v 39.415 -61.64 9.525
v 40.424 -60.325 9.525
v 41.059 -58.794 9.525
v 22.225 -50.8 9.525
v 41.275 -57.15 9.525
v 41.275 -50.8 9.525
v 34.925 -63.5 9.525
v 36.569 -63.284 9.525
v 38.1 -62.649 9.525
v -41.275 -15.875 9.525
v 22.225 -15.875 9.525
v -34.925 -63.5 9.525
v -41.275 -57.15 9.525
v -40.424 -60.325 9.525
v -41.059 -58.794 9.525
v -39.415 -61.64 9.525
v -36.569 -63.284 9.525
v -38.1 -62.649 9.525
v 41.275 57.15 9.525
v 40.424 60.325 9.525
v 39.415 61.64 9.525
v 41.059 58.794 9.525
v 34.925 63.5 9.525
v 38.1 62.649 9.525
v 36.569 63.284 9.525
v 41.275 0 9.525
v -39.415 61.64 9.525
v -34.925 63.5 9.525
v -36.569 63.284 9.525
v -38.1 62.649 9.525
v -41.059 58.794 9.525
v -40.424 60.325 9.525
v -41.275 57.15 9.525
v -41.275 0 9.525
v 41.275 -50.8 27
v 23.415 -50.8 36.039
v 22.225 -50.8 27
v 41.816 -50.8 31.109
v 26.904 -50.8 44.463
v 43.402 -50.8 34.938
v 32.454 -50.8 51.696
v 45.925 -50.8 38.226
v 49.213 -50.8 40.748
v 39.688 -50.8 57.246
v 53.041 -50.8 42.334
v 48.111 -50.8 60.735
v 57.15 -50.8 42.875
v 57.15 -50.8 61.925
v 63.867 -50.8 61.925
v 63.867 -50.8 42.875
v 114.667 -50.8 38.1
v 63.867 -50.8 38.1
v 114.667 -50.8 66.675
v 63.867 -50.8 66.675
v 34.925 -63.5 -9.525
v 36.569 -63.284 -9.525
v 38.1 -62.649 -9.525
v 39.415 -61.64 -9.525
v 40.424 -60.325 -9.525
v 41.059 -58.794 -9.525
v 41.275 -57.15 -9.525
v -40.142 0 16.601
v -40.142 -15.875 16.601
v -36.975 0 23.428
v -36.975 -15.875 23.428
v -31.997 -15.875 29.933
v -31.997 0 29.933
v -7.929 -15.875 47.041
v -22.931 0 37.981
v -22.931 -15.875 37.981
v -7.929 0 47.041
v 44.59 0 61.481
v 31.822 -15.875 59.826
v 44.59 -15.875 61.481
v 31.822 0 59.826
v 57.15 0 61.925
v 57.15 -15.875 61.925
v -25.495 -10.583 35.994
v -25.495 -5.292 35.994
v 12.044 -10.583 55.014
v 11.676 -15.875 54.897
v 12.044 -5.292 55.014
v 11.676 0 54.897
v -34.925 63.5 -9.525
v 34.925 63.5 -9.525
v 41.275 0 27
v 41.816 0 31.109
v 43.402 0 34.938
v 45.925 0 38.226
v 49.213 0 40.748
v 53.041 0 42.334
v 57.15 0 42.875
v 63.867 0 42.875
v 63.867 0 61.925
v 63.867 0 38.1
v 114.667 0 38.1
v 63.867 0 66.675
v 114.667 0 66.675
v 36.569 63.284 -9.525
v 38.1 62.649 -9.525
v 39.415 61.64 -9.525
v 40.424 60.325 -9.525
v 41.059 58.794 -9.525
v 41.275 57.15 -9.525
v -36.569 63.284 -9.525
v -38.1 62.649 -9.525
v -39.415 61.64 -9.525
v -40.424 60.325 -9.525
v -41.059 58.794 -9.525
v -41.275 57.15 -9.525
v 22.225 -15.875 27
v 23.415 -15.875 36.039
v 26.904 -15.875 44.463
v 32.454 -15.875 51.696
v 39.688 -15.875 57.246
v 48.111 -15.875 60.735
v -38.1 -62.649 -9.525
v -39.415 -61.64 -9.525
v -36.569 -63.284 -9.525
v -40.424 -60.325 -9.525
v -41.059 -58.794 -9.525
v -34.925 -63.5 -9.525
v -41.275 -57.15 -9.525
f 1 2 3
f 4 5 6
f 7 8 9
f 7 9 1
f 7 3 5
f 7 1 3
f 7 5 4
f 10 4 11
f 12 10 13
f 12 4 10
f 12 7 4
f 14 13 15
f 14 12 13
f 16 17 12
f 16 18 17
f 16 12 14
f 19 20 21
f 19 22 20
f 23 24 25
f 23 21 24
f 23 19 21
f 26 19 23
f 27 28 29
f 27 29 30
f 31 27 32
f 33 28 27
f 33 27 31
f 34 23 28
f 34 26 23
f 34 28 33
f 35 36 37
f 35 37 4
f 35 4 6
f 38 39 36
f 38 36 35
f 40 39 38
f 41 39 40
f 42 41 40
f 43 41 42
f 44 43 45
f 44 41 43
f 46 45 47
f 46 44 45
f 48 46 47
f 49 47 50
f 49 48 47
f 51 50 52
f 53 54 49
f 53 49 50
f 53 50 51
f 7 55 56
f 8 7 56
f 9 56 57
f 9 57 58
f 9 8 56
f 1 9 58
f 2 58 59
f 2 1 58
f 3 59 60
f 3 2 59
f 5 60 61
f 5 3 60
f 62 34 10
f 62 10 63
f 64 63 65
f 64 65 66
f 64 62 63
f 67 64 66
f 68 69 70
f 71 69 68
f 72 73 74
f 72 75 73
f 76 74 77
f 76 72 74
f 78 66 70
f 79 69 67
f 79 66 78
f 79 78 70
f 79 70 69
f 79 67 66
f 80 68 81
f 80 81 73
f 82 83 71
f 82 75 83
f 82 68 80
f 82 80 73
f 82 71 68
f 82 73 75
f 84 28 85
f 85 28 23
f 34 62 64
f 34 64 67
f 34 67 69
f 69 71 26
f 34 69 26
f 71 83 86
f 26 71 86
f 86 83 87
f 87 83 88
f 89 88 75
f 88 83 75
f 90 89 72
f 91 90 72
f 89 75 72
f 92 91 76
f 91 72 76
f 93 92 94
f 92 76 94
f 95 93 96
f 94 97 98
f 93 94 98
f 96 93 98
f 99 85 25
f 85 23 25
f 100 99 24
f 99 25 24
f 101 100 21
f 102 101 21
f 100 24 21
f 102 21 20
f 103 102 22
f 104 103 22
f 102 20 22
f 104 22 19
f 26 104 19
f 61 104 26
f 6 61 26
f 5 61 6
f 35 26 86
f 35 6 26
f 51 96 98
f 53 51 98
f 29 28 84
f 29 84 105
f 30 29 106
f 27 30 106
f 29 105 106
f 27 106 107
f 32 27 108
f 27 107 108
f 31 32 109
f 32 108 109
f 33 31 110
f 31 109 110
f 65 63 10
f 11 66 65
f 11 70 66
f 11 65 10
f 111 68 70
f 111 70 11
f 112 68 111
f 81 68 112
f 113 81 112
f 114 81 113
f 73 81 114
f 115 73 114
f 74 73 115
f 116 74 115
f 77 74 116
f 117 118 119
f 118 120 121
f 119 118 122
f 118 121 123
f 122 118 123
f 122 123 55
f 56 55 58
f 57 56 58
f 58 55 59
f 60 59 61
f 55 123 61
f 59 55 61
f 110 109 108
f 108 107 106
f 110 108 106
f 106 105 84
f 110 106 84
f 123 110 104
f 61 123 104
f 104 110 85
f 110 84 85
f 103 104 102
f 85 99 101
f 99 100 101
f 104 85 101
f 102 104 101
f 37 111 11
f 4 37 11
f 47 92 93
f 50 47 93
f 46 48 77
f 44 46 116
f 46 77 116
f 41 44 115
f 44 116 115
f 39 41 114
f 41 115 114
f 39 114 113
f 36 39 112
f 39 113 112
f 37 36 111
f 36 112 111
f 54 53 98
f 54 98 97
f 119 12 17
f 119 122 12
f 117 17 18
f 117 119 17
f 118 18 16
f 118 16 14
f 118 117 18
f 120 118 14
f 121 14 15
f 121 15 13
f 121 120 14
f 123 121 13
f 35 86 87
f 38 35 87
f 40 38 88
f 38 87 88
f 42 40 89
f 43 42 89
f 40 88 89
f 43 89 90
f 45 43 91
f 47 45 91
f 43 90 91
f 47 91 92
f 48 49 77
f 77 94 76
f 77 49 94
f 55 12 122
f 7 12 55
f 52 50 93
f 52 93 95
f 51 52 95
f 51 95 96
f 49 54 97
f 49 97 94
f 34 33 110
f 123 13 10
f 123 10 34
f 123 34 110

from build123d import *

# Parameters (mm, degrees)
F1_DEPTH = 63.5
F2_DEPTH = 50.8
F0_W     = 25.4
F0_H     = 19.05
F0_H_2   = 4.7498004709
F0_H_3   = 4.7751995291
F3_DEPTH = 50.8
F4_DEPTH = 15.875
F5_R     = 6.35


with BuildPart() as f1:
    # F0 (on Front) → F1 (new body, symmetric)
    with BuildSketch(Plane.XZ):
        Polygon((-41.275, 9.525), (-41.275, -9.525), (41.275, -9.525), (41.275, 9.525), (22.225, 9.525), align=None)
    extrude(amount=F1_DEPTH, both=True)

    # F0 (on Front) → F2 (join)
    with BuildSketch(Plane.XZ):
        with BuildLine():
            Line((22.225, 9.525), (41.275, 9.525))
            Line((41.275, 9.525), (41.275, 27.0002))
            ThreePointArc((41.275, 27.0002), (45.9246798487, 38.2255201513), (57.15, 42.8752))
            Line((57.15, 42.8752), (63.8665184379, 42.8752))
            Line((63.8665184379, 42.8752), (63.8665184379, 61.9252))
            Line((63.8665184379, 61.9252), (57.15, 61.9252))
            ThreePointArc((57.15, 61.9252), (32.4542956671, 51.6959043329), (22.225, 27.0002))
            Line((22.225, 27.0002), (22.225, 9.525))
        make_face()
    extrude(amount=F2_DEPTH)

    # F0 (on Front) → F3 (join)
    with BuildSketch(Plane.XZ):
        with Locations((76.5665184379, 52.4002)):
            Rectangle(F0_W, F0_H)
        Polygon((89.2665184379, 66.6750004709), (89.2665184379, 61.9252), (89.2665184379, 42.8752), (89.2665184379, 38.1000004709), (114.6665184379, 38.1000004709), (114.6665184379, 66.6750004709), align=None)
        with Locations((76.5665184379, 64.3001002354)):
            Rectangle(F0_W, F0_H_2)
        with Locations((76.5665184379, 40.4876002354)):
            Rectangle(F0_W, F0_H_3)
    extrude(amount=F3_DEPTH)

    # F0 (on Front) → F4 (join)
    with BuildSketch(Plane.XZ):
        Polygon((-41.275, 9.525), (-41.275, -9.525), (41.275, -9.525), (41.275, 9.525), (22.225, 9.525), align=None)
        with BuildLine():
            add(Edge.make_bspline(
                [(-41.275, 9.525), (-41.1059595644, 38.1653234363), (12.9924593493, 62.6207739115), (57.15, 61.9252)],
                knots=[0, 0, 0, 0, 111.5045361635, 111.5045361635, 111.5045361635, 111.5045361635], degree=3))
            Line((-41.275, 9.525), (22.225, 9.525))
            Line((22.225, 9.525), (22.225, 27.0002))
            ThreePointArc((22.225, 27.0002), (32.4542956671, 51.6959043329), (57.15, 61.9252))
        make_face()
        with BuildLine():
            Line((22.225, 9.525), (41.275, 9.525))
            Line((41.275, 9.525), (41.275, 27.0002))
            ThreePointArc((41.275, 27.0002), (45.9246798487, 38.2255201513), (57.15, 42.8752))
            Line((57.15, 42.8752), (63.8665184379, 42.8752))
            Line((63.8665184379, 42.8752), (63.8665184379, 61.9252))
            Line((63.8665184379, 61.9252), (57.15, 61.9252))
            ThreePointArc((57.15, 61.9252), (32.4542956671, 51.6959043329), (22.225, 27.0002))
            Line((22.225, 27.0002), (22.225, 9.525))
        make_face()
        with Locations((76.5665184379, 52.4002)):
            Rectangle(F0_W, F0_H)
        with Locations((76.5665184379, 64.3001002354)):
            Rectangle(F0_W, F0_H_2)
        with Locations((76.5665184379, 40.4876002354)):
            Rectangle(F0_W, F0_H_3)
        Polygon((89.2665184379, 66.6750004709), (89.2665184379, 61.9252), (89.2665184379, 42.8752), (89.2665184379, 38.1000004709), (114.6665184379, 38.1000004709), (114.6665184379, 66.6750004709), align=None)
    extrude(amount=F4_DEPTH)

    # F5
    f5_edges = [f1.edges().sort_by_distance(p)[0] for p in [
        (41.275, -63.5, 0),
        (-41.275, -63.5, 0),
        (41.275, 63.5, 0),
        (-41.275, 63.5, 0),
    ]]
    fillet(f5_edges, radius=F5_R)


solid = f1.part
